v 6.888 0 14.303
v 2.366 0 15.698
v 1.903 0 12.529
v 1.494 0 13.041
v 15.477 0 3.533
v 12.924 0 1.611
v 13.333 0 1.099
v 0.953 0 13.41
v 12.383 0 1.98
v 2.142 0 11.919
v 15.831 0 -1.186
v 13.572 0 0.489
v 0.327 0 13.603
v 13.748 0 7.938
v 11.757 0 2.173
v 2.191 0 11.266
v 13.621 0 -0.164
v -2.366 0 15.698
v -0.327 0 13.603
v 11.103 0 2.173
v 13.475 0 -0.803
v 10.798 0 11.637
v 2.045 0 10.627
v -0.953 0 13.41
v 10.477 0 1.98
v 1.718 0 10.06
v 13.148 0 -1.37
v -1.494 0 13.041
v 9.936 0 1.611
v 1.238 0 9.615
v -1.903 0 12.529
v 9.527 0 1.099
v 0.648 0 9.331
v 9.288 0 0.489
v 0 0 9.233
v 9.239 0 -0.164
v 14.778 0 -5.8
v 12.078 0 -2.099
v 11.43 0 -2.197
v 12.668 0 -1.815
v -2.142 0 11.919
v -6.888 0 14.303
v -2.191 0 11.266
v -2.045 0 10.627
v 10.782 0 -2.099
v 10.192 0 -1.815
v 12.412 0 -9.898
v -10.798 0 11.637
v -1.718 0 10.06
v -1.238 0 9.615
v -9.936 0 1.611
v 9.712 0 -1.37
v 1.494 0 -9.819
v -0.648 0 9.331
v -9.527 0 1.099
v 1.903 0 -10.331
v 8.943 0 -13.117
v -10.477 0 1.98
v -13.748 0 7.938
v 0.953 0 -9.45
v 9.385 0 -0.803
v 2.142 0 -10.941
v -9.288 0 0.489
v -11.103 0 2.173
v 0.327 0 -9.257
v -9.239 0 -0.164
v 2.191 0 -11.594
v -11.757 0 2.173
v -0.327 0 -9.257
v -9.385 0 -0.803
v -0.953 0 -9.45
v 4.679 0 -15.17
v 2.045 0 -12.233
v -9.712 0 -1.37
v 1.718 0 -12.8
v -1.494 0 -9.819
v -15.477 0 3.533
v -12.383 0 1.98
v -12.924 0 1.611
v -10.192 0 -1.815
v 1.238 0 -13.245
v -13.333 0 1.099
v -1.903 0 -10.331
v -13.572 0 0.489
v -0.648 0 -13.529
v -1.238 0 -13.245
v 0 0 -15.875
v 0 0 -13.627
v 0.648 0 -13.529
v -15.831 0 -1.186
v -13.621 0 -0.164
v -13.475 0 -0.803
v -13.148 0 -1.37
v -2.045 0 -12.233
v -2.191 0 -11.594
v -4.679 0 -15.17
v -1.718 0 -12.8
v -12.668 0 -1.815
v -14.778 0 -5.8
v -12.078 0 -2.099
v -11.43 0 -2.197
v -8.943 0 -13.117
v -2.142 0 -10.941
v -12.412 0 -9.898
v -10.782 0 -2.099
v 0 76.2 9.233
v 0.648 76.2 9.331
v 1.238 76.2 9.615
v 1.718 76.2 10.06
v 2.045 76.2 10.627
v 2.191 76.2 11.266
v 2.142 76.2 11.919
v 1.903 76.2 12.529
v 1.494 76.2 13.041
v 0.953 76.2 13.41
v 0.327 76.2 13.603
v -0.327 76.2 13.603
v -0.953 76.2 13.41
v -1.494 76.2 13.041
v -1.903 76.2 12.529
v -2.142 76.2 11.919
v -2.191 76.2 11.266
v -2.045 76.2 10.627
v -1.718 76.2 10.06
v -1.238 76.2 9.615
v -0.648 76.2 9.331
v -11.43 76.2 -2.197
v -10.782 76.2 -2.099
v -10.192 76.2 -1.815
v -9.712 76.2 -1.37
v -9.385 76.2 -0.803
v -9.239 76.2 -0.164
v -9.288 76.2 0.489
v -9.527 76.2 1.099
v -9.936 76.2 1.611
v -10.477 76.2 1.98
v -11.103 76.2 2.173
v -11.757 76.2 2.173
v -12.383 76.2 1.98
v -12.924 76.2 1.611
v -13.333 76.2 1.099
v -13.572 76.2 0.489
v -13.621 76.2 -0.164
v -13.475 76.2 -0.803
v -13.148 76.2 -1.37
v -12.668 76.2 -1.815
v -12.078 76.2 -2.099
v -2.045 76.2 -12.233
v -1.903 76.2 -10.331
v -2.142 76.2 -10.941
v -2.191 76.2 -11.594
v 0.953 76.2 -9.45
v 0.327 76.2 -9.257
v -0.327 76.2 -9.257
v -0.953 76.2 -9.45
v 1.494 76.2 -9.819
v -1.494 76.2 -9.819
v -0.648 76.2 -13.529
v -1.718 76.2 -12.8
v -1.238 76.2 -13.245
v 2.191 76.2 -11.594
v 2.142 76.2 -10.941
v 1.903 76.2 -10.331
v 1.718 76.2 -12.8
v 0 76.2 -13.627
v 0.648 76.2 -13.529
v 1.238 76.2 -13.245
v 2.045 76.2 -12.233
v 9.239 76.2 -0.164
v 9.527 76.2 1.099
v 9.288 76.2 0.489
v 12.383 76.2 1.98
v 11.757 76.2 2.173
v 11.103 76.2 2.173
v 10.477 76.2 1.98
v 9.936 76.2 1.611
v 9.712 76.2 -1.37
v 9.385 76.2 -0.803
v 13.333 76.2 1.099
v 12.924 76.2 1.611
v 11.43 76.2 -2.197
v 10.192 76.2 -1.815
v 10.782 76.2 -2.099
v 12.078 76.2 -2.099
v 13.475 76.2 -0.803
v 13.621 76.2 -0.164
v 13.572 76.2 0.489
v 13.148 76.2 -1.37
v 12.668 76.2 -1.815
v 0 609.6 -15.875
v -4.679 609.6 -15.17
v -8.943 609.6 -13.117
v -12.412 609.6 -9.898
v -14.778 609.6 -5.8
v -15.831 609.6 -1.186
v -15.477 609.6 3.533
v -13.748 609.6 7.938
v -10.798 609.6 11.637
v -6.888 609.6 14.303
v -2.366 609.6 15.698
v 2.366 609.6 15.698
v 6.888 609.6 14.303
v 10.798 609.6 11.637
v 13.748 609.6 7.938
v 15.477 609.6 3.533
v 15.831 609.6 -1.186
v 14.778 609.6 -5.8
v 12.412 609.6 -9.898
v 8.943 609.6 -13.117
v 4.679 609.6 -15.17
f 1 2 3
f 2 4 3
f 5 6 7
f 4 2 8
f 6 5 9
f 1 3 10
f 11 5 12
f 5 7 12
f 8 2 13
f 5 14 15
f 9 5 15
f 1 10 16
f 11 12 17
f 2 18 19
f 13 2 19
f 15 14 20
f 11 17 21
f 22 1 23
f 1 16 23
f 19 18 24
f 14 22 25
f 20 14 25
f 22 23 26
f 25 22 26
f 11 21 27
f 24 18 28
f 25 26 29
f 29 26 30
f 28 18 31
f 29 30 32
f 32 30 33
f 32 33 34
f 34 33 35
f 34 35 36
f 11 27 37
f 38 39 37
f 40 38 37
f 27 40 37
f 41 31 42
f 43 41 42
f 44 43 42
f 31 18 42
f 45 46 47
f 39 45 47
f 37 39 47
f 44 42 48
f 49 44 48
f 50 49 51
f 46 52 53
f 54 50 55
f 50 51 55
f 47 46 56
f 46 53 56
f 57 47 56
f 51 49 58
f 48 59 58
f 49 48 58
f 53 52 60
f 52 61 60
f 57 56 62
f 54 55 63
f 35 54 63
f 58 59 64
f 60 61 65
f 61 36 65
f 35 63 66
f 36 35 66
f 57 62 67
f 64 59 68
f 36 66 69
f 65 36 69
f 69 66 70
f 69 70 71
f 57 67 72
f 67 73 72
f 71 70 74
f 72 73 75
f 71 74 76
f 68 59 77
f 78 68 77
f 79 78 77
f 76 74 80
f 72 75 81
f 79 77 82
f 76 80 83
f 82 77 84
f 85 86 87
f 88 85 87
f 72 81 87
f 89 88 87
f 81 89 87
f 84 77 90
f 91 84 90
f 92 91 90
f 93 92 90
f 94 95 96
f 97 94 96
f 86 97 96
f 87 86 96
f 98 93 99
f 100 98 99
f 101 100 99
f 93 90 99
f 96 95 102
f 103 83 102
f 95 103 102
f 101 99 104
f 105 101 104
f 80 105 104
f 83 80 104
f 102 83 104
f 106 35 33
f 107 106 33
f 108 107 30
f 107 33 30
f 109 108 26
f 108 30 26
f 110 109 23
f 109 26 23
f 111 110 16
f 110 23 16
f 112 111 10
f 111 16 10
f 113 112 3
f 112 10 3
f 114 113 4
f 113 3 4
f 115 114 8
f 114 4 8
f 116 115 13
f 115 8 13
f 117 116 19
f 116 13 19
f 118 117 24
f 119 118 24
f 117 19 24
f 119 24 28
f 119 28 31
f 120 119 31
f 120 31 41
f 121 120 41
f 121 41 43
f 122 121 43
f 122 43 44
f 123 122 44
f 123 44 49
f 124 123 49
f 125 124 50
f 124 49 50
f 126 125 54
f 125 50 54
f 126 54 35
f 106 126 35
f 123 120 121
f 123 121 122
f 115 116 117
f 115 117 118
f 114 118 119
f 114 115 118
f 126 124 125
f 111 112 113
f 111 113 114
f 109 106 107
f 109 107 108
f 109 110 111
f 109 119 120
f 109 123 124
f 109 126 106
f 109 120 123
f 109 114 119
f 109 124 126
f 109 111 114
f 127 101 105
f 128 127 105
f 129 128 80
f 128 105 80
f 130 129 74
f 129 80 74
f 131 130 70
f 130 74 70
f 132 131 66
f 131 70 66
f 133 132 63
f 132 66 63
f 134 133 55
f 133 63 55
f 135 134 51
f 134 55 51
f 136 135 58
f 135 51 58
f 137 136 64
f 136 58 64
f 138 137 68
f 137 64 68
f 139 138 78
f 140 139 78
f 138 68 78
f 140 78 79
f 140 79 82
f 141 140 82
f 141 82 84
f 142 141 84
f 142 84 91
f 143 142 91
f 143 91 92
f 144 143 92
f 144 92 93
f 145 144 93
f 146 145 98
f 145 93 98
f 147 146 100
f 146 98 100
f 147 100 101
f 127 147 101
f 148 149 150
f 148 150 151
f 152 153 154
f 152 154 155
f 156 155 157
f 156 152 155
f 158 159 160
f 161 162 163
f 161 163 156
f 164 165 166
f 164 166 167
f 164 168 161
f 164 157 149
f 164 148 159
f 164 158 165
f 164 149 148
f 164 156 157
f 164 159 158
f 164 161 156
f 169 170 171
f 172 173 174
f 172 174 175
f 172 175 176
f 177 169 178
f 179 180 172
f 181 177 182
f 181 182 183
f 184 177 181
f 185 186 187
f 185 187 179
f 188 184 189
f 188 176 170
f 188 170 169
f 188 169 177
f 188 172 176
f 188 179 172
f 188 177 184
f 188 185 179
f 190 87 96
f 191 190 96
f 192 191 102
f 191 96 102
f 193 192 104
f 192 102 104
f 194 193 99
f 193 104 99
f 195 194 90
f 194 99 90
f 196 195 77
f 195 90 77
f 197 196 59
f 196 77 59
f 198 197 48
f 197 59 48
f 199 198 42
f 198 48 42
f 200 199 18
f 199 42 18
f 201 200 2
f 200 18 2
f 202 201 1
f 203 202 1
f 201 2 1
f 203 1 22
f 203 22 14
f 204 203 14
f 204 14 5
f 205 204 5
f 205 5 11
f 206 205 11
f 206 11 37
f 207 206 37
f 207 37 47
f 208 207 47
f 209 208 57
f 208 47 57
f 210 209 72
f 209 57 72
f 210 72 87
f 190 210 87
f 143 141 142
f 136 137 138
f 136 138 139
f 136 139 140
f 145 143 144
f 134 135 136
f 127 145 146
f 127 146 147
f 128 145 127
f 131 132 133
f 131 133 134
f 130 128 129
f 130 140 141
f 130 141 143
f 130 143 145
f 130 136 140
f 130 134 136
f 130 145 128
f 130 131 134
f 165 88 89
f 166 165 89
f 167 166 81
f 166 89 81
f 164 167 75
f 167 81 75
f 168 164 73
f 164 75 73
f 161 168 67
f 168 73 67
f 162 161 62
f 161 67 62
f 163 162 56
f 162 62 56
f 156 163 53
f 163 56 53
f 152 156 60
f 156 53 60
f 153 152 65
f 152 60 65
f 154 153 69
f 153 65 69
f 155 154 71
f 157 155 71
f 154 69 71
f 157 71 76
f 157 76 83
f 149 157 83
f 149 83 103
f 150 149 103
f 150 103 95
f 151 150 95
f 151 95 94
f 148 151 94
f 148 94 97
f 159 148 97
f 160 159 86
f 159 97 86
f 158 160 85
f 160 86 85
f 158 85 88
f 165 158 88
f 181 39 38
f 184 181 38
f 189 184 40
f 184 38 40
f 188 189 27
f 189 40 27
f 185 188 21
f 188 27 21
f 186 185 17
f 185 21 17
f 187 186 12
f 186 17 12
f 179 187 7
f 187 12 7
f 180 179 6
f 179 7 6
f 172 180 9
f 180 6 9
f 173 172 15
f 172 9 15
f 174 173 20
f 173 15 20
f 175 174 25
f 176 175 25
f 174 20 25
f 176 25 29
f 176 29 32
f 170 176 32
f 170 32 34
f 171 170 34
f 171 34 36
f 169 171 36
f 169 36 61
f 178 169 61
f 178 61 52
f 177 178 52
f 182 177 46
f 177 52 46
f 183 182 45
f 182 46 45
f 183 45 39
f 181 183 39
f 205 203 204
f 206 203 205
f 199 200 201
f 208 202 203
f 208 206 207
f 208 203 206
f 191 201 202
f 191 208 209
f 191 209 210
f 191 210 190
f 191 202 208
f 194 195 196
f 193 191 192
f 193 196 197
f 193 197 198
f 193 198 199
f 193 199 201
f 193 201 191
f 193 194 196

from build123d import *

# Parameters (mm, degrees)
SKETCH1_R           = 15.875
BOSS_EXTRUDE1_DEPTH = 609.6
SKETCH2_R           = 2.1971
CUT_EXTRUDE1_DEPTH  = 76.2


with BuildPart() as part:
    # Sketch1 → Boss-Extrude1 (new body)
    with BuildSketch(Plane(origin=(0, 0, 0), x_dir=(1, 0, 0), z_dir=(0, 1, 0))):
        with Locations(Location((0, 0, 0), (0, 0, 90))):
            Circle(SKETCH1_R)
    extrude(amount=BOSS_EXTRUDE1_DEPTH)

    # Sketch2 → Cut-Extrude1 (cut)
    with BuildSketch(Plane.XZ):
        with Locations(Location((0, 11.43, 0), (0, 0, 270))):
            Circle(SKETCH2_R)
        with Locations(Location((11.43, 0, 0), (0, 0, 270))):
            Circle(SKETCH2_R)
        with Locations(Location((0, -11.43, 0), (0, 0, 270))):
            Circle(SKETCH2_R)
        with Locations(Location((-11.43, 0, 0), (0, 0, 270))):
            Circle(SKETCH2_R)
    extrude(amount=-CUT_EXTRUDE1_DEPTH, mode=Mode.SUBTRACT)


solid = part.part
